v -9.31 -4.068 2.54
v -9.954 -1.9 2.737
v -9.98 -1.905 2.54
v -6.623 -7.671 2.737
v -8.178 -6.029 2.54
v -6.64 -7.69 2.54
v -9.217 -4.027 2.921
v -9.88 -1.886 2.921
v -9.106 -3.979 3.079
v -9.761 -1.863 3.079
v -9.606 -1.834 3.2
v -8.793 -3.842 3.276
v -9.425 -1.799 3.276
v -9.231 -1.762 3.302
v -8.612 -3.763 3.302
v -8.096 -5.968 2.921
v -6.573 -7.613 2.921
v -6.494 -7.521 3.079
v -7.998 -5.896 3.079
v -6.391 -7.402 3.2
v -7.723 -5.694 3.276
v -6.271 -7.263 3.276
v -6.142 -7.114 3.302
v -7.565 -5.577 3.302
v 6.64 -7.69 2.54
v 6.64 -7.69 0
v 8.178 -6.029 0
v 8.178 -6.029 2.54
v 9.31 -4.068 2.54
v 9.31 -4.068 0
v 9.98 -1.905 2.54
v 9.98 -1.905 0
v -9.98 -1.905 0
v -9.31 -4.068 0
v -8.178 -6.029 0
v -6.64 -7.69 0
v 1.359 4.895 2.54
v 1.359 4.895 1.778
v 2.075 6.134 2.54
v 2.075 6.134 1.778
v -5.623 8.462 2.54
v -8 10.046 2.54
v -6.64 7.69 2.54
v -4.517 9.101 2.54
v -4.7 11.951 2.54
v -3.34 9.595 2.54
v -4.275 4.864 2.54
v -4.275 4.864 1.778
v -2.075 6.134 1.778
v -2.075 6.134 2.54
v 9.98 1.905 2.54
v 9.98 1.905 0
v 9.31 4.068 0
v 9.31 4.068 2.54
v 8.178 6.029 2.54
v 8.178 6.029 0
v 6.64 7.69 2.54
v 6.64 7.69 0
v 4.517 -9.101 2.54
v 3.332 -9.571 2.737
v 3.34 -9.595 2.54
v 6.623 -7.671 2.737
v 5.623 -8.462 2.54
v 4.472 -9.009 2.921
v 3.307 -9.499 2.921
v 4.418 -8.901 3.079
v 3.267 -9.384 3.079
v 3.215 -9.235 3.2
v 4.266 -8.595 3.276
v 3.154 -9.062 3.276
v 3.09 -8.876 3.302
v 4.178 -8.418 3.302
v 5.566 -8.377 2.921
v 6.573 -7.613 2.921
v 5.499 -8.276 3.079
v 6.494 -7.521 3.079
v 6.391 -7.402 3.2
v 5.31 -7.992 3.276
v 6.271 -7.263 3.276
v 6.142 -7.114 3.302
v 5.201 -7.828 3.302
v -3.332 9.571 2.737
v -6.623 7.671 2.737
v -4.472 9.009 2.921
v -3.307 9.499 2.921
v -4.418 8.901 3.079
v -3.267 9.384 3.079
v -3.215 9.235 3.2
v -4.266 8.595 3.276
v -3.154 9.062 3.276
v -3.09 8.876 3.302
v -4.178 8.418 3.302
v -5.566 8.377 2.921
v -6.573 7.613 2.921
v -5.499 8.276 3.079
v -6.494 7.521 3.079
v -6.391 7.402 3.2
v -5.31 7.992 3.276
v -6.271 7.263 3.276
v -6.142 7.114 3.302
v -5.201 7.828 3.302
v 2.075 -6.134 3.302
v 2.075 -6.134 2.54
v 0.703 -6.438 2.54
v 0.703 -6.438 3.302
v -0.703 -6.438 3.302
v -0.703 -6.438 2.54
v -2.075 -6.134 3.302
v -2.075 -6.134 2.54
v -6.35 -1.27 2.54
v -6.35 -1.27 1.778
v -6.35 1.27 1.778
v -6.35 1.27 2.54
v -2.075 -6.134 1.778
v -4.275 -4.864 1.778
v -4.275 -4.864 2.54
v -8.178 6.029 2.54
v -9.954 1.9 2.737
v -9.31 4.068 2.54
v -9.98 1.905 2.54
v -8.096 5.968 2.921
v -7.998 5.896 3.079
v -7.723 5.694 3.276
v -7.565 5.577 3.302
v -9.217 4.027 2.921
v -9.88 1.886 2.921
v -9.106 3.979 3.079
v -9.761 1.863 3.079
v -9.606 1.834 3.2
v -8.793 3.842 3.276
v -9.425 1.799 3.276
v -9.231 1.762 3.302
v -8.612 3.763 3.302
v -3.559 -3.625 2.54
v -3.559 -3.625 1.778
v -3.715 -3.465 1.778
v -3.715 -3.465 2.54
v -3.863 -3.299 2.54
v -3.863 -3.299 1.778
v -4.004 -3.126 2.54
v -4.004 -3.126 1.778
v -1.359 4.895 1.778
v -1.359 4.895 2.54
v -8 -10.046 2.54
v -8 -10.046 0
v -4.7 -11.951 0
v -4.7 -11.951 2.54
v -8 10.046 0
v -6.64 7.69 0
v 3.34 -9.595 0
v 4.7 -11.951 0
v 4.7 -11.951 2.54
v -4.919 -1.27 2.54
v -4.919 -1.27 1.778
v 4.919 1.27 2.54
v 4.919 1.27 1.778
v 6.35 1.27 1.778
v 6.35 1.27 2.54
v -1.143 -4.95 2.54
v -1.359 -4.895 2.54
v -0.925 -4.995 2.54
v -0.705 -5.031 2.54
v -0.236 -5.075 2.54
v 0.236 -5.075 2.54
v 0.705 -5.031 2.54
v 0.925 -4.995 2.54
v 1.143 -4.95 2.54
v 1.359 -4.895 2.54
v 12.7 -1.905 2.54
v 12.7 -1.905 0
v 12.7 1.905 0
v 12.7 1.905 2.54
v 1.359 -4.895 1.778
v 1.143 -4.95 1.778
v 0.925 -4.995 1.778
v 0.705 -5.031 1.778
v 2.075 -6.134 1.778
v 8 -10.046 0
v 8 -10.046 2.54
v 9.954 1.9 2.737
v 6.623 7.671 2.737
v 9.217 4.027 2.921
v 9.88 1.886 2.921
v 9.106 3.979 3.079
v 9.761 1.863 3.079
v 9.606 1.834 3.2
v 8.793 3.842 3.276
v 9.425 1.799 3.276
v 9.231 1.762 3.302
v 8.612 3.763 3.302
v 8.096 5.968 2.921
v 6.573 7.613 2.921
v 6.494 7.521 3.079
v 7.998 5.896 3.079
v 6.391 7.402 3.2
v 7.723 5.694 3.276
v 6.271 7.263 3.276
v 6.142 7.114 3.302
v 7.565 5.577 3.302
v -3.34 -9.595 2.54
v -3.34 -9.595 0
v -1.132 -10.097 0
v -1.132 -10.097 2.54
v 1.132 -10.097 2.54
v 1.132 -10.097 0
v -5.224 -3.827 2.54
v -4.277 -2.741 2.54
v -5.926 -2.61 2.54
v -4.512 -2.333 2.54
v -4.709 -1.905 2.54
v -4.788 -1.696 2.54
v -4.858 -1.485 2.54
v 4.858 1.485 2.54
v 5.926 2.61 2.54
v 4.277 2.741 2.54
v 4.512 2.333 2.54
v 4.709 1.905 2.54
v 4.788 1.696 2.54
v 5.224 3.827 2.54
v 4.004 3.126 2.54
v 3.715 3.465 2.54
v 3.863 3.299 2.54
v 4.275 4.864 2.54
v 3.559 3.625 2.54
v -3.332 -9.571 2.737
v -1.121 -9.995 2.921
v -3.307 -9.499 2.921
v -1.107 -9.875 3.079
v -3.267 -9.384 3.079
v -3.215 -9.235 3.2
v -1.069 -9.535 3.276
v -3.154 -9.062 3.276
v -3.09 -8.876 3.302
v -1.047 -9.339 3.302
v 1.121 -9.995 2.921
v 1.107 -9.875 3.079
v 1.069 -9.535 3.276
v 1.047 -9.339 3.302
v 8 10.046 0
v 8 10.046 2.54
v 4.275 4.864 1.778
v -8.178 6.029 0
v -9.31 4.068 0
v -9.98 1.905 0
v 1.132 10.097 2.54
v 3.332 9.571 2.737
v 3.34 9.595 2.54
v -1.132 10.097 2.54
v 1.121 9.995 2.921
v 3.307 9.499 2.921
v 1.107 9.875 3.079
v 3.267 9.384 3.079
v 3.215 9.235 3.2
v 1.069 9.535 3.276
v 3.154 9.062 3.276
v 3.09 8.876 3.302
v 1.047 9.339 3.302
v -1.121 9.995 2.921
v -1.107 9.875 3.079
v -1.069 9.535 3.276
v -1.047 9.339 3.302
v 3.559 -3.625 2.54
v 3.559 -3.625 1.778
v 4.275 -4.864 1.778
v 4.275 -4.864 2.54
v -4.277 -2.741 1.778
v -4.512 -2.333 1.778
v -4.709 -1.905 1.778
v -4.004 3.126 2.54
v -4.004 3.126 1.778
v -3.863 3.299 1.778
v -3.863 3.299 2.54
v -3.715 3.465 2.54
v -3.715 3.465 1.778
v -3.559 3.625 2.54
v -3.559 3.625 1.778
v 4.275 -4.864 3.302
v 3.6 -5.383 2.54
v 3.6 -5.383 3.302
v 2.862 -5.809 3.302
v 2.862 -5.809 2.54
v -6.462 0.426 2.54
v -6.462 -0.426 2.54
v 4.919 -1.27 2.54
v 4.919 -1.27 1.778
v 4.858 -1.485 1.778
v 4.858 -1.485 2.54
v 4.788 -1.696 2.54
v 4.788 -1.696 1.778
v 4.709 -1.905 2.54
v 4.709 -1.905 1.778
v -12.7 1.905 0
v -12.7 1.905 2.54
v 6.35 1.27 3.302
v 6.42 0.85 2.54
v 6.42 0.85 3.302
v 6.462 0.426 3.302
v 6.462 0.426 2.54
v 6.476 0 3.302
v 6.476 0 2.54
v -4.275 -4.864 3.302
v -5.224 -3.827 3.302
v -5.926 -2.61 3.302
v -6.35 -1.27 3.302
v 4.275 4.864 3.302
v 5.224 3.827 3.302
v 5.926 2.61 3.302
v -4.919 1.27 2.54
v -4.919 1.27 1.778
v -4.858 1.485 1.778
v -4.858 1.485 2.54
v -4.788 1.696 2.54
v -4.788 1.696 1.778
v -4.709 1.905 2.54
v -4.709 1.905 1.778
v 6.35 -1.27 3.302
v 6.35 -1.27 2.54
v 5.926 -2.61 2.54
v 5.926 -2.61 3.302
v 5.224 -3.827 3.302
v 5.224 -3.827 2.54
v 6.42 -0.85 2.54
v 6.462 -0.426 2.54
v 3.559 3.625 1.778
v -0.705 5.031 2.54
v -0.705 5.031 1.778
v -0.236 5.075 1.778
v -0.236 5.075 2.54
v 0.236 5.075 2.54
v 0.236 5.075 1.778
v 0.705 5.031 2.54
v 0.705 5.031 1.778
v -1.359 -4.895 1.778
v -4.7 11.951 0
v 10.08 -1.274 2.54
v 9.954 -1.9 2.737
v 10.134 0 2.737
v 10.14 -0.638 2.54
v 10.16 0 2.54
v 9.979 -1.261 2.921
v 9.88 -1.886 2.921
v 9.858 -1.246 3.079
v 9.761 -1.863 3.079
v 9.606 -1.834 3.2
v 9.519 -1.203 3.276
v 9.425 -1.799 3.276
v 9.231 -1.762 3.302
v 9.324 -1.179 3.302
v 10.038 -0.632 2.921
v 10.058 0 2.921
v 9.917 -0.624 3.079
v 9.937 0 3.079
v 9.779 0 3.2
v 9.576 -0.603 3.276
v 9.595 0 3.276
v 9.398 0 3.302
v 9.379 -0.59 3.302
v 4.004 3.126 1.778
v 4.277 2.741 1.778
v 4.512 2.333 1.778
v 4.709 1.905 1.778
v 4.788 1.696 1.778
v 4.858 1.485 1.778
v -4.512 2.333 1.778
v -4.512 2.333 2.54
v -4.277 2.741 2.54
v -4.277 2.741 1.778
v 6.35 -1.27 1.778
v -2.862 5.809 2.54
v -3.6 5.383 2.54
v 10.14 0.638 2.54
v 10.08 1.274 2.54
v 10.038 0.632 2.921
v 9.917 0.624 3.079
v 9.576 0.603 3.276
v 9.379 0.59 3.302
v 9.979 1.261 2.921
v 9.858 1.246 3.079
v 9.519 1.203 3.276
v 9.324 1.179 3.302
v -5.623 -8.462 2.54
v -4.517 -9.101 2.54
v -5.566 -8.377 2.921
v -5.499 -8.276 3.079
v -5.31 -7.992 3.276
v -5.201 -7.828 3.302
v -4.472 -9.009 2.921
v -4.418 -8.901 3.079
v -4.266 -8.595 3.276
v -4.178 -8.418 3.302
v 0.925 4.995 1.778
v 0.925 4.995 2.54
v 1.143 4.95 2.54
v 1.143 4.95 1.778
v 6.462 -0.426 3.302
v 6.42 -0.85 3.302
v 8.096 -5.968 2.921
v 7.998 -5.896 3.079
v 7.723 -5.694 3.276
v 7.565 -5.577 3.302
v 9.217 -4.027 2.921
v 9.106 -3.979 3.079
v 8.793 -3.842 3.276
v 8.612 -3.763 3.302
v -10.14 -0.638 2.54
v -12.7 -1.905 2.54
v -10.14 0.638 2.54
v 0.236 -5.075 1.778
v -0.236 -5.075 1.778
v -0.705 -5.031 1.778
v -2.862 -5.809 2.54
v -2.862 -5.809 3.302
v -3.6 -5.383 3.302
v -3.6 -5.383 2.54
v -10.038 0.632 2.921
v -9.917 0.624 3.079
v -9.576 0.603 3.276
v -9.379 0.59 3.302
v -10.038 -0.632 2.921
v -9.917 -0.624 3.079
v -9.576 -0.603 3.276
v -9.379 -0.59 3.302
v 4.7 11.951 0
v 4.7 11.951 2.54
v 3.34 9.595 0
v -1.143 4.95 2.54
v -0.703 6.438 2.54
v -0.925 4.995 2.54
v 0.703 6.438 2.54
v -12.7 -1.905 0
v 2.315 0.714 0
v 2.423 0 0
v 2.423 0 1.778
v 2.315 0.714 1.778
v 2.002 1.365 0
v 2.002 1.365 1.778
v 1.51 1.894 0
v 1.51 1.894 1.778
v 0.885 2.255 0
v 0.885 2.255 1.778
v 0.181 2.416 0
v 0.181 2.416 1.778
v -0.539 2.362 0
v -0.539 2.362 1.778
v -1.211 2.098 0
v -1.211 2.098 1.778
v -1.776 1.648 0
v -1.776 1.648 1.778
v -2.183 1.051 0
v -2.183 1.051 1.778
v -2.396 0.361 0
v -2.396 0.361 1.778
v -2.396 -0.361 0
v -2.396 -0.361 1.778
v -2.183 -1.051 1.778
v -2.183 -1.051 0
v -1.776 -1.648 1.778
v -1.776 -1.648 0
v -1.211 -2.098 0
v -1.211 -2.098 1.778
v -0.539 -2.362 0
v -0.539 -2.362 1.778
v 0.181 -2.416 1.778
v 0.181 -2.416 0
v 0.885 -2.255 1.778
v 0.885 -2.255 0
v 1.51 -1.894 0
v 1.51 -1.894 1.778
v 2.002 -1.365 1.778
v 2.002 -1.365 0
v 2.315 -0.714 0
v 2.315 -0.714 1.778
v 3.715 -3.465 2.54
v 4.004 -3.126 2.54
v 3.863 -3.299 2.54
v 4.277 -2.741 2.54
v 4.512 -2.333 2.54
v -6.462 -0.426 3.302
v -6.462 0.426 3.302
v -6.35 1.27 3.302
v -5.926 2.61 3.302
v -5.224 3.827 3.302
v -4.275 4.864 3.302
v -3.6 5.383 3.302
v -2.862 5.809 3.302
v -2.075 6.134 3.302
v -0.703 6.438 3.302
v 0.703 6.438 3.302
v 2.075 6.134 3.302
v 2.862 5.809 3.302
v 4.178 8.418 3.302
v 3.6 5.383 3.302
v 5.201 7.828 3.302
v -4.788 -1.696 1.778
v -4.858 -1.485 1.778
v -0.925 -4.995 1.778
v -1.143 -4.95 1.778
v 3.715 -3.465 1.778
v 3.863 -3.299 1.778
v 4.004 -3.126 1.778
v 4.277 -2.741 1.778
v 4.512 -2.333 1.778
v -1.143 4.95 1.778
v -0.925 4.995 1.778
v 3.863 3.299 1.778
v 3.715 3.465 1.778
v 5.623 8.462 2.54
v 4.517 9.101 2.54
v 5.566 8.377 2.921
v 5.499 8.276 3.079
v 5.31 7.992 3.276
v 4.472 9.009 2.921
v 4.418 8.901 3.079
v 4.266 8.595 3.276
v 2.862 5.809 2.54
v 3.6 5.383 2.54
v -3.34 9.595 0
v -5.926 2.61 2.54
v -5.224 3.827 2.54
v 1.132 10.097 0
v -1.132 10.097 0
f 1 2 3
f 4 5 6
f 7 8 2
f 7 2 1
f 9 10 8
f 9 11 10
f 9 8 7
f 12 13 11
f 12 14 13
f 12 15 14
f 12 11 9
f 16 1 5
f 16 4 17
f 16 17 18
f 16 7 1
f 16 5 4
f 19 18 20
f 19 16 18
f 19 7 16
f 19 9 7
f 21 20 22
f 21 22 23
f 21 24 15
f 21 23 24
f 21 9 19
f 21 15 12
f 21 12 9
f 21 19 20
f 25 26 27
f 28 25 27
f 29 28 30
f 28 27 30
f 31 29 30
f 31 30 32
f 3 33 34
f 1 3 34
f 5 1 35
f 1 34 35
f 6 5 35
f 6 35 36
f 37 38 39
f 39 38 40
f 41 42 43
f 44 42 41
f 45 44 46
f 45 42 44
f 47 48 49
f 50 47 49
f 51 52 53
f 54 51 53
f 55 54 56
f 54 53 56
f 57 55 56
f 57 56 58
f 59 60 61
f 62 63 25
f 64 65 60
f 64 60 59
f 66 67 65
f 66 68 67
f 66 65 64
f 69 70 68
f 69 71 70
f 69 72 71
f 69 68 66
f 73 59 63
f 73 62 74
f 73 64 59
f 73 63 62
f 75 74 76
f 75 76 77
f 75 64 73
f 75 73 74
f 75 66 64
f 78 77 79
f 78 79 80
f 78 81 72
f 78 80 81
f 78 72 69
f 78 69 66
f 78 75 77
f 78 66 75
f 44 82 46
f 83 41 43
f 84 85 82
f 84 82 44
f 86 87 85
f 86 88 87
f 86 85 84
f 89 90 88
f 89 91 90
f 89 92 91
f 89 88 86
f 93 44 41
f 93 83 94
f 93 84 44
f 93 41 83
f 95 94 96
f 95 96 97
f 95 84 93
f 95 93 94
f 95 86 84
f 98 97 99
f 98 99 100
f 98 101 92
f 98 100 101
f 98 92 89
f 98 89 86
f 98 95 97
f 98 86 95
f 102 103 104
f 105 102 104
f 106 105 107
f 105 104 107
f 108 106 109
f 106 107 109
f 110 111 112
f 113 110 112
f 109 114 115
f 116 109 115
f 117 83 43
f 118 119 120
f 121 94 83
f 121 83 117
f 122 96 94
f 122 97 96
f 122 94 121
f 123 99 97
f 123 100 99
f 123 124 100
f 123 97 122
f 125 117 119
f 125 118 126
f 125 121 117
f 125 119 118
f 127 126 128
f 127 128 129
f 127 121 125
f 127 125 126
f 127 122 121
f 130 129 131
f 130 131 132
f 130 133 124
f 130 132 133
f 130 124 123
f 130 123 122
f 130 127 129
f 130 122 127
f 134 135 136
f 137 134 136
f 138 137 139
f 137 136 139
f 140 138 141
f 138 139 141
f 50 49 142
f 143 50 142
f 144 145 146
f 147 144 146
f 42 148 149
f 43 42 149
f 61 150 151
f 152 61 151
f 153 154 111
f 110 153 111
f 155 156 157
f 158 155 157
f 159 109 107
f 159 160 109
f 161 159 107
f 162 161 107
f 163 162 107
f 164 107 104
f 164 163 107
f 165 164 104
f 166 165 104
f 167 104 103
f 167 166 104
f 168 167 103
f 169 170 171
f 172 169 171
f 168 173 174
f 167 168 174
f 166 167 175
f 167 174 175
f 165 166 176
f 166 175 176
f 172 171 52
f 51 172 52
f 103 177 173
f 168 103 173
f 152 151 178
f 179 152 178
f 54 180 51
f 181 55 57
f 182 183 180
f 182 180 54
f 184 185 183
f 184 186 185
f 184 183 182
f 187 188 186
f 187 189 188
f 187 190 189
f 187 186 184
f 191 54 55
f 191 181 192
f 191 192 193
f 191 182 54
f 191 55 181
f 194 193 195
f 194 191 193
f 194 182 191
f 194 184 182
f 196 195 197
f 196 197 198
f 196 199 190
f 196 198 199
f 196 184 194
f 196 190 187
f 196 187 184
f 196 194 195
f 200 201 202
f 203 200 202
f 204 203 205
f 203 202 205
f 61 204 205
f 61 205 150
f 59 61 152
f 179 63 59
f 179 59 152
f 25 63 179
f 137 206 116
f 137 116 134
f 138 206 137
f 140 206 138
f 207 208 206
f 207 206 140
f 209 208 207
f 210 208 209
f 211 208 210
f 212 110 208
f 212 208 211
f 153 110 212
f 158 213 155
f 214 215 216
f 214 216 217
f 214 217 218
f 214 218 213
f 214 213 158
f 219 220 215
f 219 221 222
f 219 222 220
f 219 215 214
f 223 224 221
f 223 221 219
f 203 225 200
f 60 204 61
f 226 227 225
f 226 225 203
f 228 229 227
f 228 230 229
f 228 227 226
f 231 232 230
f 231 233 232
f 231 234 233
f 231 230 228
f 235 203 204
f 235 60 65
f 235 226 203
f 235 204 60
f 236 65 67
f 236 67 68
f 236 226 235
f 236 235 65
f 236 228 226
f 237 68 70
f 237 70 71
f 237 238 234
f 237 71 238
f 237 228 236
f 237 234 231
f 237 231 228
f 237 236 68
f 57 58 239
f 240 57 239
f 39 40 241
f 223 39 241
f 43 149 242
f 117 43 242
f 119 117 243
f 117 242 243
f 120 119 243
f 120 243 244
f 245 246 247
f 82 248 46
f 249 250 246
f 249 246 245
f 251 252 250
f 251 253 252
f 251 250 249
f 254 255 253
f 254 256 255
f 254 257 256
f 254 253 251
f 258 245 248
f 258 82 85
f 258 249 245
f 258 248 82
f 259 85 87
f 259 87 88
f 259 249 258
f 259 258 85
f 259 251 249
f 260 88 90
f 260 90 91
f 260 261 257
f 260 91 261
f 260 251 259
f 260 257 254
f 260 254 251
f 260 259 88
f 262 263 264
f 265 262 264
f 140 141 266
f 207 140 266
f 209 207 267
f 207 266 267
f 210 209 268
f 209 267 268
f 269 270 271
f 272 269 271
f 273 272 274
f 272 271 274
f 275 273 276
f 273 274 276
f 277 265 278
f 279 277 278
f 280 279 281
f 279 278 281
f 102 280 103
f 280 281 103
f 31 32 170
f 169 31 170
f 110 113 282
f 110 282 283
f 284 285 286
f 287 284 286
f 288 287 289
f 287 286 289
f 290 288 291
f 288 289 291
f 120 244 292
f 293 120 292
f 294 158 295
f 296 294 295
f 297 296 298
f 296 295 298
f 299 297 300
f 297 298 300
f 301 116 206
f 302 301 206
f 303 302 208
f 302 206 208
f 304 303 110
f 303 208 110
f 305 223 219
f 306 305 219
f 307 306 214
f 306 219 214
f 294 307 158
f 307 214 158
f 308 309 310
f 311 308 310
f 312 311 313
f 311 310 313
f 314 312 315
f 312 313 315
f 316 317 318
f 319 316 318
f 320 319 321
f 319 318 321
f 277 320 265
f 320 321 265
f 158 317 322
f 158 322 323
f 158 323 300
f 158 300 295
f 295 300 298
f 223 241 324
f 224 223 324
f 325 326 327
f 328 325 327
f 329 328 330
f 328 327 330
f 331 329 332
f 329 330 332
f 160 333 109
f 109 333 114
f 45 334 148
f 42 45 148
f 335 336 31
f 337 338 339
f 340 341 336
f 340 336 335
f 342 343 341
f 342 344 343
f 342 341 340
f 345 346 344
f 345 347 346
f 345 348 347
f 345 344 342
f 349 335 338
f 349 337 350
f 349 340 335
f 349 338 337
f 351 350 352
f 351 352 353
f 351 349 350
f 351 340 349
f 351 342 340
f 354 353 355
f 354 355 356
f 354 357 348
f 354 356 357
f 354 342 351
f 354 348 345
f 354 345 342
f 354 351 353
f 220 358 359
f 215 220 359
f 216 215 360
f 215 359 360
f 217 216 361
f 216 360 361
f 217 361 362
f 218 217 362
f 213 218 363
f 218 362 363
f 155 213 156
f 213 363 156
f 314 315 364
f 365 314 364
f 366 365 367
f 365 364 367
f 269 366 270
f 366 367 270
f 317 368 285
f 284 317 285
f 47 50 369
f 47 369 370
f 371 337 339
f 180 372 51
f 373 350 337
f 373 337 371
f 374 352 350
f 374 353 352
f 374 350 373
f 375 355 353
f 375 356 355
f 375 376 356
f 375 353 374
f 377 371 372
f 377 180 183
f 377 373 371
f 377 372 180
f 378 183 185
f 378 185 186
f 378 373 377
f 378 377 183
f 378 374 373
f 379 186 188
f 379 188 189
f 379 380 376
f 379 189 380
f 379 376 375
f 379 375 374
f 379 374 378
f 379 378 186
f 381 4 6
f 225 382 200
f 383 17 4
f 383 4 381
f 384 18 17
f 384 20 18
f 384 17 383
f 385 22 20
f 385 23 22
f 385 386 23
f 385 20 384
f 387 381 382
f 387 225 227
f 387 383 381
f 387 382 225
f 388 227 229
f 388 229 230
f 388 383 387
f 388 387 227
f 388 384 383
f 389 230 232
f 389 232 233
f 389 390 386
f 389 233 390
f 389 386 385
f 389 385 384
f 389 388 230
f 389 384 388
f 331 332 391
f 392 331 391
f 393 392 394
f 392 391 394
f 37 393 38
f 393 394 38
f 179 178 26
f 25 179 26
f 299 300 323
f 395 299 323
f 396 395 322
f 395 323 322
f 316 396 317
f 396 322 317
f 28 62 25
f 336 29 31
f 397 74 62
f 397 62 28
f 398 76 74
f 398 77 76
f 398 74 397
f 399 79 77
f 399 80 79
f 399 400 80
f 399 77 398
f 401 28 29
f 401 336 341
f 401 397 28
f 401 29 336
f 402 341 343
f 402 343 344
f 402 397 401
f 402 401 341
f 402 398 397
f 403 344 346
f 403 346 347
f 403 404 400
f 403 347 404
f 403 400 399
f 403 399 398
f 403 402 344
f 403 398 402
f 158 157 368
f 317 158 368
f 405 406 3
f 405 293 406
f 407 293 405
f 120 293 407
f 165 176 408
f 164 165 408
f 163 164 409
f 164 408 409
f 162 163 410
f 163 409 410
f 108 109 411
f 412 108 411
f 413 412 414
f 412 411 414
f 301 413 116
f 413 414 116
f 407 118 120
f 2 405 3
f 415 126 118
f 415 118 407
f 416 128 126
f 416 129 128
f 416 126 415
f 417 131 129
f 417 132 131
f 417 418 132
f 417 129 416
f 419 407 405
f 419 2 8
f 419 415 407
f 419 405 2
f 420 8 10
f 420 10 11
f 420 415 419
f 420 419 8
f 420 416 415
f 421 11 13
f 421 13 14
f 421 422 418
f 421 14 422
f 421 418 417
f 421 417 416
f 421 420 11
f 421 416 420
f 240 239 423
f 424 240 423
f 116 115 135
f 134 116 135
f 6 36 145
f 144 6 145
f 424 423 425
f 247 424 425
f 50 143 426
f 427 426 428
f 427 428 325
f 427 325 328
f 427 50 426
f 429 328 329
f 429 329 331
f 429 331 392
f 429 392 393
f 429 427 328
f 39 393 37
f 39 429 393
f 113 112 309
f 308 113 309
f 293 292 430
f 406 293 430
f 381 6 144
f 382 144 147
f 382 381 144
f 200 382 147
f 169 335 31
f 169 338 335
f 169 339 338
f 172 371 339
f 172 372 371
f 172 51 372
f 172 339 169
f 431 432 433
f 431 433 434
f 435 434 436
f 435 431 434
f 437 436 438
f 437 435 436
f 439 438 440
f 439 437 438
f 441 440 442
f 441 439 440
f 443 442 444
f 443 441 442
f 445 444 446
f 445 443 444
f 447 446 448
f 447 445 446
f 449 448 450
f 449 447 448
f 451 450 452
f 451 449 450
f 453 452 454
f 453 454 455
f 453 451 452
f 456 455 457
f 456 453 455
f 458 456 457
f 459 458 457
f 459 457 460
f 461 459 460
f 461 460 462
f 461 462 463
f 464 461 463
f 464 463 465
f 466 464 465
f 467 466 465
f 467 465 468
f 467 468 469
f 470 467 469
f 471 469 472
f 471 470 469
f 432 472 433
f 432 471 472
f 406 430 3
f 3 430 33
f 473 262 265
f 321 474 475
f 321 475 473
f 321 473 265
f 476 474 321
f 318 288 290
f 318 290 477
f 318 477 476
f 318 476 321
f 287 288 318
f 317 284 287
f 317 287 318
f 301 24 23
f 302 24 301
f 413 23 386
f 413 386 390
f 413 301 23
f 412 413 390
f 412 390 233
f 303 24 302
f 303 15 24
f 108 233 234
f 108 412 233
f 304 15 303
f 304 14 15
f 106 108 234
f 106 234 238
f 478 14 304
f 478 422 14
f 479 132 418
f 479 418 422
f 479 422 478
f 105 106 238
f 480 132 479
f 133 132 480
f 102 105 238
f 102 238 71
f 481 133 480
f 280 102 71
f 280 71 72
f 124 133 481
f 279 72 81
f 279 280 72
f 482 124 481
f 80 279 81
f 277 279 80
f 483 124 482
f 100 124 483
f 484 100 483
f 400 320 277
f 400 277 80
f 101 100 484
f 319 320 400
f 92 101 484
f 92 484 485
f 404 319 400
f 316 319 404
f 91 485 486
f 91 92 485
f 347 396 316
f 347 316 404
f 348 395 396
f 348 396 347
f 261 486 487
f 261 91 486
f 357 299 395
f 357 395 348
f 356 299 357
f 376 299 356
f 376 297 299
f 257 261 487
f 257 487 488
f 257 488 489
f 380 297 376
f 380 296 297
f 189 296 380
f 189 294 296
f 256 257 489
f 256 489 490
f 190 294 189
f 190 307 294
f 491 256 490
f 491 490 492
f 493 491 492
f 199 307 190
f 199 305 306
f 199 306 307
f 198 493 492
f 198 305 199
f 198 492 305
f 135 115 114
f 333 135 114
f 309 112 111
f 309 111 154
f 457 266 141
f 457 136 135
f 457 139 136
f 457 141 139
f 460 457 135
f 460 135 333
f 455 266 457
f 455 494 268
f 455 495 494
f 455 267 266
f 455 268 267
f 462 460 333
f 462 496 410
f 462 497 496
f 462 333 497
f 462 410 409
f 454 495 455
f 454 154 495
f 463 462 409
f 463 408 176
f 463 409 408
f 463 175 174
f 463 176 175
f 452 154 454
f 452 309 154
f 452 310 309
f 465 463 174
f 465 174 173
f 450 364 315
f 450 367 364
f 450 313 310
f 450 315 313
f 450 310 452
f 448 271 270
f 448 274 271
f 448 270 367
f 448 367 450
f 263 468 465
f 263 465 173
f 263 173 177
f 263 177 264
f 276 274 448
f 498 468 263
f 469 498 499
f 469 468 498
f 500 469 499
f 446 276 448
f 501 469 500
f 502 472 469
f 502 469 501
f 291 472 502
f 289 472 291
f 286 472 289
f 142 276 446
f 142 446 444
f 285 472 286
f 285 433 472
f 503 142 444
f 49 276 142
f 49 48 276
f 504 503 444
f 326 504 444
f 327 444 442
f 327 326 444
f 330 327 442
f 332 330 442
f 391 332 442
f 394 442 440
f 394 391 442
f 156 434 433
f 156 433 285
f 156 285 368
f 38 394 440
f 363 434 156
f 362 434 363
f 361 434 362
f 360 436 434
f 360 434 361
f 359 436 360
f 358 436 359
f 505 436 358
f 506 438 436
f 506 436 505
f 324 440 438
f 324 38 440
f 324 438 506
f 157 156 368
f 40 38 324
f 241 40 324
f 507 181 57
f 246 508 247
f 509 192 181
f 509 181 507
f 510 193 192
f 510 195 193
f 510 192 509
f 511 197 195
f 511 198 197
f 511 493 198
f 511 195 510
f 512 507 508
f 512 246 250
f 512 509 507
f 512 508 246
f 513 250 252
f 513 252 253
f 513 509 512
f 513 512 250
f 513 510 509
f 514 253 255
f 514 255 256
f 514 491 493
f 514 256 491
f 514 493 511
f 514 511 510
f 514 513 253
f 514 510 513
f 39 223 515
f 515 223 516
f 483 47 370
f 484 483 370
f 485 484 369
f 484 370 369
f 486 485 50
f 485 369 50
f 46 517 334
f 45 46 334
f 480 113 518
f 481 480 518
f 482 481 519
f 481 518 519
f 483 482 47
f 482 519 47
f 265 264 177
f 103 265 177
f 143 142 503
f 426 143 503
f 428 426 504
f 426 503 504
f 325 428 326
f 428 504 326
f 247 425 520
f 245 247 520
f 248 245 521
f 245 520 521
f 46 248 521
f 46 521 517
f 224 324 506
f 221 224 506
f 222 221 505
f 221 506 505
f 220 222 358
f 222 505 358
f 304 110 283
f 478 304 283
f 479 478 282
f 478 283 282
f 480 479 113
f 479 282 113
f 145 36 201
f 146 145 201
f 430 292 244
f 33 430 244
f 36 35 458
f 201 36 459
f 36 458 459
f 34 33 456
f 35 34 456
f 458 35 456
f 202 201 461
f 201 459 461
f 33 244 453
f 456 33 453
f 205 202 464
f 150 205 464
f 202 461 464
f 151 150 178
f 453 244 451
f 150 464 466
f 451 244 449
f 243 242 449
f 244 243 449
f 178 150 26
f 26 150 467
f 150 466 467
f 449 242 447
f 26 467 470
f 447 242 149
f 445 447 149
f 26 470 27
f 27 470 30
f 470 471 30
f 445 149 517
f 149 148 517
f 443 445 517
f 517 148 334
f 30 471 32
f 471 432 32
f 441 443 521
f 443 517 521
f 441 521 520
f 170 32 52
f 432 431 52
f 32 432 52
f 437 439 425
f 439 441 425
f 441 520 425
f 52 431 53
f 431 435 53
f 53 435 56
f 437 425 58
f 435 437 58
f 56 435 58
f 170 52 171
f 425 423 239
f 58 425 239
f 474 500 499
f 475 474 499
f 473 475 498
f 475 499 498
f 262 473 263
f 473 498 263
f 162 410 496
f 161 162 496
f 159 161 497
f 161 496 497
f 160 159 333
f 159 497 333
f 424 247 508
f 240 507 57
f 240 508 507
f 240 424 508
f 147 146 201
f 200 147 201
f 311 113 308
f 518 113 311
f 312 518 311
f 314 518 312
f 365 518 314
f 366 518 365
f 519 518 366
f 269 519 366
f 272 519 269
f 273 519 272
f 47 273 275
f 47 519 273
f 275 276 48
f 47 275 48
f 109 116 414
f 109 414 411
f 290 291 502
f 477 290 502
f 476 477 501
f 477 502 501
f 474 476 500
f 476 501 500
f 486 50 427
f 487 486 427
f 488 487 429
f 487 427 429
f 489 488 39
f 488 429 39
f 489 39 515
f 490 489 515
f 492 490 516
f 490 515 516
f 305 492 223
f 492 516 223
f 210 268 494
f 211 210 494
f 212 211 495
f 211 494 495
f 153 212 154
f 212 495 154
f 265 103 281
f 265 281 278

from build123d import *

# Parameters (mm, degrees)
F2_DEPTH = 2.54
F3_R     = 7.6884407039
F3_R_2   = 2.4226171542
F4_DEPTH = 1.778
F6_DEPTH = 0.762
F7_R     = 0.76199


# Not quite as in the source:
# - a fillet or chamfer is up to 0.001 mm smaller than in the source, because OpenCascade refuses the exact size


with BuildPart() as f2:
    # F1 (on Top) → F2 (new body)
    with BuildSketch(Plane.XY):
        with BuildLine():
            ThreePointArc((9.9798083649, -1.905), (10.1148517781, -0.9567515385), (10.16, 0))
            ThreePointArc((10.16, 0), (10.1148517781, 0.9567515385), (9.9798083649, 1.905))
            Line((9.9798083649, 1.905), (4.7092860393, 1.905))
            ThreePointArc((4.7092860393, 1.905), (4.8244462237, 1.5909489729), (4.9186888497, 1.27))
            Line((4.9186888497, 1.27), (6.35, 1.27))
            Line((6.35, 1.27), (6.35, -1.27))
            Line((6.35, -1.27), (4.9186888497, -1.27))
            ThreePointArc((4.9186888497, -1.27), (4.8244462237, -1.5909489729), (4.7092860393, -1.905))
            Line((4.7092860393, -1.905), (9.9798083649, -1.905))
        make_face()
        with BuildLine():
            ThreePointArc((9.9798083649, 1.905), (10.1148517781, 0.9567515385), (10.16, 0))
            ThreePointArc((10.16, 0), (10.1148517781, -0.9567515385), (9.9798083649, -1.905))
            Line((9.9798083649, -1.905), (12.7, -1.905))
            Line((12.7, -1.905), (12.7, 1.905))
            Line((12.7, 1.905), (9.9798083649, 1.905))
        make_face()
        with BuildLine():
            Line((4.7092860393, 1.905), (9.9798083649, 1.905))
            ThreePointArc((9.9798083649, 1.905), (8.7988181024, 5.08), (6.6396825767, 7.6902675689))
            Line((6.6396825767, 7.6902675689), (4.0044214139, 3.1258613437))
            ThreePointArc((4.0044214139, 3.1258613437), (4.3994090512, 2.54), (4.7092860393, 1.905))
        make_face()
        with BuildLine():
            ThreePointArc((6.6396825767, -7.6902675689), (8.7988181024, -5.08), (9.9798083649, -1.905))
            Line((9.9798083649, -1.905), (4.7092860393, -1.905))
            ThreePointArc((4.7092860393, -1.905), (4.3994090512, -2.54), (4.0044214139, -3.1258613437))
            Line((4.0044214139, -3.1258613437), (6.6396825767, -7.6902675689))
        make_face()
        with BuildLine():
            Line((4.0044214139, 3.1258613437), (6.6396825767, 7.6902675689))
            ThreePointArc((6.6396825767, 7.6902675689), (5.08, 8.7988181024), (3.3401257882, 9.5952675689))
            Line((3.3401257882, 9.5952675689), (0.7048646254, 5.0308613437))
            ThreePointArc((0.7048646254, 5.0308613437), (1.0344208852, 4.9735674754), (1.359492162, 4.8947094971))
            Line((1.359492162, 4.8947094971), (2.0751477372, 6.134261314))
            Line((2.0751477372, 6.134261314), (4.2748522628, 4.864261314))
            Line((4.2748522628, 4.864261314), (3.5591966876, 3.6247094971))
            ThreePointArc((3.5591966876, 3.6247094971), (3.7900253385, 3.3826185025), (4.0044214139, 3.1258613437))
        make_face()
        with BuildLine():
            ThreePointArc((3.3401257882, 9.5952675689), (5.08, 8.7988181024), (6.6396825767, 7.6902675689))
            Line((6.6396825767, 7.6902675689), (7.9997783942, 10.0460226281))
            Line((7.9997783942, 10.0460226281), (4.7002216058, 11.9510226281))
            Line((4.7002216058, 11.9510226281), (3.3401257882, 9.5952675689))
        make_face()
        with BuildLine():
            Line((7.9997783942, -10.0460226281), (6.6396825767, -7.6902675689))
            ThreePointArc((6.6396825767, -7.6902675689), (5.08, -8.7988181024), (3.3401257882, -9.5952675689))
            Line((3.3401257882, -9.5952675689), (4.7002216058, -11.9510226281))
            Line((4.7002216058, -11.9510226281), (7.9997783942, -10.0460226281))
        make_face()
        with BuildLine():
            ThreePointArc((3.3401257882, -9.5952675689), (5.08, -8.7988181024), (6.6396825767, -7.6902675689))
            Line((6.6396825767, -7.6902675689), (4.0044214139, -3.1258613437))
            ThreePointArc((4.0044214139, -3.1258613437), (3.7900253385, -3.3826185025), (3.5591966876, -3.6247094971))
            Line((3.5591966876, -3.6247094971), (4.2748522628, -4.864261314))
            Line((4.2748522628, -4.864261314), (2.0751477372, -6.134261314))
            Line((2.0751477372, -6.134261314), (1.359492162, -4.8947094971))
            ThreePointArc((1.359492162, -4.8947094971), (1.0344208852, -4.9735674754), (0.7048646254, -5.0308613437))
            Line((0.7048646254, -5.0308613437), (3.3401257882, -9.5952675689))
        make_face()
        with BuildLine():
            Line((0.7048646254, 5.0308613437), (3.3401257882, 9.5952675689))
            ThreePointArc((3.3401257882, 9.5952675689), (0, 10.16), (-3.3401257882, 9.5952675689))
            Line((-3.3401257882, 9.5952675689), (-0.7048646254, 5.0308613437))
            ThreePointArc((-0.7048646254, 5.0308613437), (0, 5.08), (0.7048646254, 5.0308613437))
        make_face()
        with BuildLine():
            ThreePointArc((-3.3401257882, -9.5952675689), (0, -10.16), (3.3401257882, -9.5952675689))
            Line((3.3401257882, -9.5952675689), (0.7048646254, -5.0308613437))
            ThreePointArc((0.7048646254, -5.0308613437), (0, -5.08), (-0.7048646254, -5.0308613437))
            Line((-0.7048646254, -5.0308613437), (-3.3401257882, -9.5952675689))
        make_face()
        with BuildLine():
            Line((-0.7048646254, 5.0308613437), (-3.3401257882, 9.5952675689))
            ThreePointArc((-3.3401257882, 9.5952675689), (-5.08, 8.7988181024), (-6.6396825767, 7.6902675689))
            Line((-6.6396825767, 7.6902675689), (-4.0044214139, 3.1258613437))
            ThreePointArc((-4.0044214139, 3.1258613437), (-3.7900253385, 3.3826185025), (-3.5591966876, 3.6247094971))
            Line((-3.5591966876, 3.6247094971), (-4.2748522628, 4.864261314))
            Line((-4.2748522628, 4.864261314), (-2.0751477372, 6.134261314))
            Line((-2.0751477372, 6.134261314), (-1.359492162, 4.8947094971))
            ThreePointArc((-1.359492162, 4.8947094971), (-1.0344208852, 4.9735674754), (-0.7048646254, 5.0308613437))
        make_face()
        with BuildLine():
            ThreePointArc((-6.6396825767, 7.6902675689), (-5.08, 8.7988181024), (-3.3401257882, 9.5952675689))
            Line((-3.3401257882, 9.5952675689), (-4.7002216058, 11.9510226281))
            Line((-4.7002216058, 11.9510226281), (-7.9997783942, 10.0460226281))
            Line((-7.9997783942, 10.0460226281), (-6.6396825767, 7.6902675689))
        make_face()
        with BuildLine():
            Line((-4.7002216058, -11.9510226281), (-3.3401257882, -9.5952675689))
            ThreePointArc((-3.3401257882, -9.5952675689), (-5.08, -8.7988181024), (-6.6396825767, -7.6902675689))
            Line((-6.6396825767, -7.6902675689), (-7.9997783942, -10.0460226281))
            Line((-7.9997783942, -10.0460226281), (-4.7002216058, -11.9510226281))
        make_face()
        with BuildLine():
            ThreePointArc((-6.6396825767, -7.6902675689), (-5.08, -8.7988181024), (-3.3401257882, -9.5952675689))
            Line((-3.3401257882, -9.5952675689), (-0.7048646254, -5.0308613437))
            ThreePointArc((-0.7048646254, -5.0308613437), (-1.0344208852, -4.9735674754), (-1.359492162, -4.8947094971))
            Line((-1.359492162, -4.8947094971), (-2.0751477372, -6.134261314))
            Line((-2.0751477372, -6.134261314), (-4.2748522628, -4.864261314))
            Line((-4.2748522628, -4.864261314), (-3.5591966876, -3.6247094971))
            ThreePointArc((-3.5591966876, -3.6247094971), (-3.7900253385, -3.3826185025), (-4.0044214139, -3.1258613437))
            Line((-4.0044214139, -3.1258613437), (-6.6396825767, -7.6902675689))
        make_face()
        with BuildLine():
            Line((-4.0044214139, 3.1258613437), (-6.6396825767, 7.6902675689))
            ThreePointArc((-6.6396825767, 7.6902675689), (-8.7988181024, 5.08), (-9.9798083649, 1.905))
            Line((-9.9798083649, 1.905), (-4.7092860393, 1.905))
            ThreePointArc((-4.7092860393, 1.905), (-4.3994090512, 2.54), (-4.0044214139, 3.1258613437))
        make_face()
        with BuildLine():
            ThreePointArc((-9.9798083649, -1.905), (-8.7988181024, -5.08), (-6.6396825767, -7.6902675689))
            Line((-6.6396825767, -7.6902675689), (-4.0044214139, -3.1258613437))
            ThreePointArc((-4.0044214139, -3.1258613437), (-4.3994090512, -2.54), (-4.7092860393, -1.905))
            Line((-4.7092860393, -1.905), (-9.9798083649, -1.905))
        make_face()
        with BuildLine():
            Line((-4.7092860393, 1.905), (-9.9798083649, 1.905))
            ThreePointArc((-9.9798083649, 1.905), (-10.16, 0), (-9.9798083649, -1.905))
            Line((-9.9798083649, -1.905), (-4.7092860393, -1.905))
            ThreePointArc((-4.7092860393, -1.905), (-4.8244462237, -1.5909489729), (-4.9186888497, -1.27))
            Line((-4.9186888497, -1.27), (-6.35, -1.27))
            Line((-6.35, -1.27), (-6.35, 1.27))
            Line((-6.35, 1.27), (-4.9186888497, 1.27))
            ThreePointArc((-4.9186888497, 1.27), (-4.8244462237, 1.5909489729), (-4.7092860393, 1.905))
        make_face()
        with BuildLine():
            ThreePointArc((-9.9798083649, -1.905), (-10.16, 0), (-9.9798083649, 1.905))
            Line((-9.9798083649, 1.905), (-12.7, 1.905))
            Line((-12.7, 1.905), (-12.7, -1.905))
            Line((-12.7, -1.905), (-9.9798083649, -1.905))
        make_face()
    extrude(amount=F2_DEPTH)

    # F3 (on face) → F4 (join)
    with BuildSketch(Plane.XY):
        Circle(F3_R)
        Circle(F3_R_2, mode=Mode.SUBTRACT)
    extrude(amount=F4_DEPTH)

    # F5 (on face) → F6 (join)
    with BuildSketch(Plane.XY.offset(2.54)):
        with BuildLine():
            ThreePointArc((9.9798083649, -1.905), (10.1148517781, -0.9567515385), (10.16, 0))
            ThreePointArc((10.16, 0), (10.1148517781, 0.9567515385), (9.9798083649, 1.905))
            ThreePointArc((9.9798083649, 1.905), (8.7988181024, 5.08), (6.6396825767, 7.6902675689))
            ThreePointArc((6.6396825767, 7.6902675689), (5.08, 8.7988181024), (3.3401257882, 9.5952675689))
            ThreePointArc((3.3401257882, 9.5952675689), (0, 10.16), (-3.3401257882, 9.5952675689))
            ThreePointArc((-3.3401257882, 9.5952675689), (-5.08, 8.7988181024), (-6.6396825767, 7.6902675689))
            ThreePointArc((-6.6396825767, 7.6902675689), (-8.7988181024, 5.08), (-9.9798083649, 1.905))
            ThreePointArc((-9.9798083649, 1.905), (-10.16, 0), (-9.9798083649, -1.905))
            ThreePointArc((-9.9798083649, -1.905), (-8.7988181024, -5.08), (-6.6396825767, -7.6902675689))
            ThreePointArc((-6.6396825767, -7.6902675689), (-5.08, -8.7988181024), (-3.3401257882, -9.5952675689))
            ThreePointArc((-3.3401257882, -9.5952675689), (0, -10.16), (3.3401257882, -9.5952675689))
            ThreePointArc((3.3401257882, -9.5952675689), (5.08, -8.7988181024), (6.6396825767, -7.6902675689))
            ThreePointArc((6.6396825767, -7.6902675689), (8.7988181024, -5.08), (9.9798083649, -1.905))
        make_face()
        with BuildLine():
            ThreePointArc((6.35, 1.27), (6.4442393992, 0.6381054508), (6.4757547823, 0))
            ThreePointArc((6.4757547823, 0), (6.4442393992, -0.6381054508), (6.35, -1.27))
            ThreePointArc((6.35, -1.27), (5.6081681501, -3.2378773911), (4.2748522628, -4.864261314))
            ThreePointArc((4.2748522628, -4.864261314), (3.2378773911, -5.6081681501), (2.0751477372, -6.134261314))
            ThreePointArc((2.0751477372, -6.134261314), (0, -6.4757547823), (-2.0751477372, -6.134261314))
            ThreePointArc((-2.0751477372, -6.134261314), (-3.2378773911, -5.6081681501), (-4.2748522628, -4.864261314))
            ThreePointArc((-4.2748522628, -4.864261314), (-5.6081681501, -3.2378773911), (-6.35, -1.27))
            ThreePointArc((-6.35, -1.27), (-6.4757547823, 0), (-6.35, 1.27))
            ThreePointArc((-6.35, 1.27), (-5.6081681501, 3.2378773911), (-4.2748522628, 4.864261314))
            ThreePointArc((-4.2748522628, 4.864261314), (-3.2378773911, 5.6081681501), (-2.0751477372, 6.134261314))
            ThreePointArc((-2.0751477372, 6.134261314), (0, 6.4757547823), (2.0751477372, 6.134261314))
            ThreePointArc((2.0751477372, 6.134261314), (3.2378773911, 5.6081681501), (4.2748522628, 4.864261314))
            ThreePointArc((4.2748522628, 4.864261314), (5.6081681501, 3.2378773911), (6.35, 1.27))
        make_face(mode=Mode.SUBTRACT)
    extrude(amount=F6_DEPTH)

    # F7 (radius 0.762 in the source; OpenCascade refuses exactly that, so slightly less here)
    f7_edges = [f2.edges().sort_by_distance(p)[0] for p in [
        (9.979808, 1.905, 3.302),
    ]]
    fillet(f7_edges, radius=F7_R)


solid = f2.part
